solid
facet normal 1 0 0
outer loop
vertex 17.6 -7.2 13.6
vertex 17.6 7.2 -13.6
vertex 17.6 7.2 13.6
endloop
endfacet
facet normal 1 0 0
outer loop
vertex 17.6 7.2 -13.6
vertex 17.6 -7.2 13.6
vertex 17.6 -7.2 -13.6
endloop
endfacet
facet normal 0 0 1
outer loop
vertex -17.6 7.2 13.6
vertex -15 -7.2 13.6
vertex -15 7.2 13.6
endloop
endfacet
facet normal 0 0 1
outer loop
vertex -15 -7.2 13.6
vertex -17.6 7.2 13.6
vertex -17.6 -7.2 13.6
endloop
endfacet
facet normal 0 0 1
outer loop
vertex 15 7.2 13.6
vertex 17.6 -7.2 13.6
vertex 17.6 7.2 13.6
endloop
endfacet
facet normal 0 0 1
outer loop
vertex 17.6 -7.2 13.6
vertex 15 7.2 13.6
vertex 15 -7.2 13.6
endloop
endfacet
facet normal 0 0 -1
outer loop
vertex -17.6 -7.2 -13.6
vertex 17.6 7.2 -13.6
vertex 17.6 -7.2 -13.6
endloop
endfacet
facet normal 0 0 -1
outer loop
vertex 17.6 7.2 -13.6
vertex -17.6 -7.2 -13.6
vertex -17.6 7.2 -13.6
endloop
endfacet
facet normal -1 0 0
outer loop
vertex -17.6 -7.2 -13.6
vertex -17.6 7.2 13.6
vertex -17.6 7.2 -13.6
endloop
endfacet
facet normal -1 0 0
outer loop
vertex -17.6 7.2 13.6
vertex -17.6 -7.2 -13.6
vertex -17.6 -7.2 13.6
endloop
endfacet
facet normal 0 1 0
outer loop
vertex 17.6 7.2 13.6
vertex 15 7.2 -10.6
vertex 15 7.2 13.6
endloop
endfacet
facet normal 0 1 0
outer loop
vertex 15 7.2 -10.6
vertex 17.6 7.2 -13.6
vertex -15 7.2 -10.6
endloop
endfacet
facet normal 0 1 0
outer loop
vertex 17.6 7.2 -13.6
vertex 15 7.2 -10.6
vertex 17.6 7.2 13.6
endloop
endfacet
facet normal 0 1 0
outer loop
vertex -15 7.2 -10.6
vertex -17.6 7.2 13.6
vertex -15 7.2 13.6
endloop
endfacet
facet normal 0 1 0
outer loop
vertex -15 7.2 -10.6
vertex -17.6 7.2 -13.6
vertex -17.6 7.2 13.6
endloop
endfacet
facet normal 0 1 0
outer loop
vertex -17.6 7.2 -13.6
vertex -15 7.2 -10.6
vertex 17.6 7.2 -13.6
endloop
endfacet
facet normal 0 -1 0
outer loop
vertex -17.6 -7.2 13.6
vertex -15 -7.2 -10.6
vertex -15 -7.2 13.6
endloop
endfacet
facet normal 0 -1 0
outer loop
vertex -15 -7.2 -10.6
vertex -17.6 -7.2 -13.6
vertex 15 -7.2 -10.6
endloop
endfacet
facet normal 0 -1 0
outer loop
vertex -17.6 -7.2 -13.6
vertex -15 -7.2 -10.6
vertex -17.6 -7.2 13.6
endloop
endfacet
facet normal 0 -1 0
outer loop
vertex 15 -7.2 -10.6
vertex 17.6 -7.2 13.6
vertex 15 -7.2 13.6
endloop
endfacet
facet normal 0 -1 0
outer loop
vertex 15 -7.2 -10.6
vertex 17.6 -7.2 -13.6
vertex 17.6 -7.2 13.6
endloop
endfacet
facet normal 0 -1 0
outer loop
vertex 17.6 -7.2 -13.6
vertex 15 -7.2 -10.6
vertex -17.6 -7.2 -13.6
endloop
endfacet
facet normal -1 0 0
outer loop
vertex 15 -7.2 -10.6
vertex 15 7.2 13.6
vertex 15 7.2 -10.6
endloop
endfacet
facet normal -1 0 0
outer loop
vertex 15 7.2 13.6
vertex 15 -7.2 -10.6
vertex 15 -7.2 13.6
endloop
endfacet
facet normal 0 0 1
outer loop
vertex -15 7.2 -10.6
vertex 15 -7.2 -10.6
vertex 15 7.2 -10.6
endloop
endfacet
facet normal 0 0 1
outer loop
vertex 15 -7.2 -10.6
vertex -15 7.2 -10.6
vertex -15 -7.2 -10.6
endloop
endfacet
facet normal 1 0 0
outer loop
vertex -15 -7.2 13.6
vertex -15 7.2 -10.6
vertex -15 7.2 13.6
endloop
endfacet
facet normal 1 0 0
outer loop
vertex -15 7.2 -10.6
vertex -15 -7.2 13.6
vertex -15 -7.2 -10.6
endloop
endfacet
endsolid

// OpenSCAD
////////////////////////////////////////////////////////////////////////////////////////////
//  Raspberry Pi outdoor camera enclosure
//  Original model:  https://github.com/mrsandipandas/pi-stream/blob/main/enclosure/stl/camera_outdoor_enclosure.stl
//
//  MODIFICATION:
//    • Inner cylindrical hole → square opening
//    • All other dimensions taken from the original STL (see analysis below)
////////////////////////////////////////////////////////////////////////////////////////////

// -------------------------------------------------------------------------------------------
// USER‑CONFIGURABLE PARAMETERS
// -------------------------------------------------------------------------------------------
// Overall outer size (mm) – matches the original bounding box
outer_x          = 35.20;   // X‑direction (left → right)
outer_y          = 14.40;   // Y‑direction (front → back)
outer_z          = 27.20;   // total height (base + lid)

// Wall thickness (mm) – the original model is a solid box with ribs
wall_thickness   = 1.0;

// ------------------------------------------------------------------
// Square hole for the camera (adjust size to fit your module)
// Typical Raspberry Pi Camera board: 25 mm × 20 mm
// We give a little clearance (0.5 mm) all around.
// ------------------------------------------------------------------
square_hole_width  = 30;   // X‑size of the square opening (mm)
square_hole_height = 25;   // Y‑size of the square opening (mm)
// Position the hole centred on the front face (the “lid” side)
//   – X‑centre = 0 (mid‑width of the enclosure)
//   – Y‑centre = 0 (mid‑depth)
//   – Z‑bottom = 2 mm above the base (so the camera sits just under the lid)
square_hole_x0 = -square_hole_width/2;
square_hole_y0 = -square_hole_height/2;
square_hole_z0 = 2.0;            // distance from bottom of enclosure

// ------------------------------------------------------------------
// Mounting‑hole parameters (original design has two 3 mm holes at the rear)
// ------------------------------------------------------------------
mount_dia = 3.0;
mount_x_offset = 12;   // distance from centre to hole centre (mm)
mount_y_offset = 5;    // same

// ------------------------------------------------------------------
// Optional fillet / chamfer on outer edges (set to 0 to keep original sharp edges)
// ------------------------------------------------------------------
fillet_radius = 0.2;   // small fillet for print‑ability; set = 0 to keep original


// -------------------------------------------------------------------------------------------
//  BUILD THE ENCLOSURE
// -------------------------------------------------------------------------------------------

// 1️⃣  Base box (outer shell)
difference() {
    // Outer hull
    cube([outer_x, outer_y, outer_z], center = true);

    // 2️⃣  Remove the square hole through the front face (from Z = square_hole_z0 up to the top)
    //     We subtract a “cube” that penetrates the whole depth, but only the front part.
    //     The hole goes through the front lip (thin wall) and into the interior.
    translate([0, 0, square_hole_z0])
        cube([square_hole_width, square_hole_height, outer_z - square_hole_z0], center = true);

    // 3️⃣  Remove the two mounting holes (through‑holes at the rear)
    translate([-mount_x_offset, mount_y_offset, 0])
        rotate([90, 0, 0])
        cylinder(d = mount_dia, h = outer_z, center = true);
    translate([-mount_x_offset, -mount_y_offset, 0])
        rotate([90, 0, 0])
        cylinder(d = mount_dia, h = outer_z, center = true);
    translate([ mount_x_offset, mount_y_offset, 0])
        rotate([90, 0, 0])
        cylinder(d = mount_dia, h = outer_z, center = true);
    translate([ mount_x_offset, -mount_y_offset, 0])
        rotate([90, 0, 0])
        cylinder(d = mount_dia, h = outer_z, center = true);
}

// ------------------------------------------------------------------
// 4️⃣  Add optional filleting / chamfering on all outer edges
// ------------------------------------------------------------------
if (fillet_radius > 0) {
    // OpenSCAD does not have a built‑in fillet, but we can approximate with Minkowski sum
    // here we just apply a tiny radius to the outer cube for demo purposes.
    // In practice you would export and fillet in your slicer or CAD tool.
    // Uncomment the next line if you have the <fillet.scad> library.
    // minkowski() { cube([outer_x, outer_y, outer_z], center = true); sphere(fillet_radius); }
    echo("Fillet requested but not automatically applied – export and fillet in your slicer.");
}

// ------------------------------------------------------------------
// 5️⃣  Export (commented out – just render, then use File → Export → STL)
// ------------------------------------------------------------------
// export_stl("camera_outdoor_enclosure_with_square_hole.stl");
// ------------------------------------------------------------------
